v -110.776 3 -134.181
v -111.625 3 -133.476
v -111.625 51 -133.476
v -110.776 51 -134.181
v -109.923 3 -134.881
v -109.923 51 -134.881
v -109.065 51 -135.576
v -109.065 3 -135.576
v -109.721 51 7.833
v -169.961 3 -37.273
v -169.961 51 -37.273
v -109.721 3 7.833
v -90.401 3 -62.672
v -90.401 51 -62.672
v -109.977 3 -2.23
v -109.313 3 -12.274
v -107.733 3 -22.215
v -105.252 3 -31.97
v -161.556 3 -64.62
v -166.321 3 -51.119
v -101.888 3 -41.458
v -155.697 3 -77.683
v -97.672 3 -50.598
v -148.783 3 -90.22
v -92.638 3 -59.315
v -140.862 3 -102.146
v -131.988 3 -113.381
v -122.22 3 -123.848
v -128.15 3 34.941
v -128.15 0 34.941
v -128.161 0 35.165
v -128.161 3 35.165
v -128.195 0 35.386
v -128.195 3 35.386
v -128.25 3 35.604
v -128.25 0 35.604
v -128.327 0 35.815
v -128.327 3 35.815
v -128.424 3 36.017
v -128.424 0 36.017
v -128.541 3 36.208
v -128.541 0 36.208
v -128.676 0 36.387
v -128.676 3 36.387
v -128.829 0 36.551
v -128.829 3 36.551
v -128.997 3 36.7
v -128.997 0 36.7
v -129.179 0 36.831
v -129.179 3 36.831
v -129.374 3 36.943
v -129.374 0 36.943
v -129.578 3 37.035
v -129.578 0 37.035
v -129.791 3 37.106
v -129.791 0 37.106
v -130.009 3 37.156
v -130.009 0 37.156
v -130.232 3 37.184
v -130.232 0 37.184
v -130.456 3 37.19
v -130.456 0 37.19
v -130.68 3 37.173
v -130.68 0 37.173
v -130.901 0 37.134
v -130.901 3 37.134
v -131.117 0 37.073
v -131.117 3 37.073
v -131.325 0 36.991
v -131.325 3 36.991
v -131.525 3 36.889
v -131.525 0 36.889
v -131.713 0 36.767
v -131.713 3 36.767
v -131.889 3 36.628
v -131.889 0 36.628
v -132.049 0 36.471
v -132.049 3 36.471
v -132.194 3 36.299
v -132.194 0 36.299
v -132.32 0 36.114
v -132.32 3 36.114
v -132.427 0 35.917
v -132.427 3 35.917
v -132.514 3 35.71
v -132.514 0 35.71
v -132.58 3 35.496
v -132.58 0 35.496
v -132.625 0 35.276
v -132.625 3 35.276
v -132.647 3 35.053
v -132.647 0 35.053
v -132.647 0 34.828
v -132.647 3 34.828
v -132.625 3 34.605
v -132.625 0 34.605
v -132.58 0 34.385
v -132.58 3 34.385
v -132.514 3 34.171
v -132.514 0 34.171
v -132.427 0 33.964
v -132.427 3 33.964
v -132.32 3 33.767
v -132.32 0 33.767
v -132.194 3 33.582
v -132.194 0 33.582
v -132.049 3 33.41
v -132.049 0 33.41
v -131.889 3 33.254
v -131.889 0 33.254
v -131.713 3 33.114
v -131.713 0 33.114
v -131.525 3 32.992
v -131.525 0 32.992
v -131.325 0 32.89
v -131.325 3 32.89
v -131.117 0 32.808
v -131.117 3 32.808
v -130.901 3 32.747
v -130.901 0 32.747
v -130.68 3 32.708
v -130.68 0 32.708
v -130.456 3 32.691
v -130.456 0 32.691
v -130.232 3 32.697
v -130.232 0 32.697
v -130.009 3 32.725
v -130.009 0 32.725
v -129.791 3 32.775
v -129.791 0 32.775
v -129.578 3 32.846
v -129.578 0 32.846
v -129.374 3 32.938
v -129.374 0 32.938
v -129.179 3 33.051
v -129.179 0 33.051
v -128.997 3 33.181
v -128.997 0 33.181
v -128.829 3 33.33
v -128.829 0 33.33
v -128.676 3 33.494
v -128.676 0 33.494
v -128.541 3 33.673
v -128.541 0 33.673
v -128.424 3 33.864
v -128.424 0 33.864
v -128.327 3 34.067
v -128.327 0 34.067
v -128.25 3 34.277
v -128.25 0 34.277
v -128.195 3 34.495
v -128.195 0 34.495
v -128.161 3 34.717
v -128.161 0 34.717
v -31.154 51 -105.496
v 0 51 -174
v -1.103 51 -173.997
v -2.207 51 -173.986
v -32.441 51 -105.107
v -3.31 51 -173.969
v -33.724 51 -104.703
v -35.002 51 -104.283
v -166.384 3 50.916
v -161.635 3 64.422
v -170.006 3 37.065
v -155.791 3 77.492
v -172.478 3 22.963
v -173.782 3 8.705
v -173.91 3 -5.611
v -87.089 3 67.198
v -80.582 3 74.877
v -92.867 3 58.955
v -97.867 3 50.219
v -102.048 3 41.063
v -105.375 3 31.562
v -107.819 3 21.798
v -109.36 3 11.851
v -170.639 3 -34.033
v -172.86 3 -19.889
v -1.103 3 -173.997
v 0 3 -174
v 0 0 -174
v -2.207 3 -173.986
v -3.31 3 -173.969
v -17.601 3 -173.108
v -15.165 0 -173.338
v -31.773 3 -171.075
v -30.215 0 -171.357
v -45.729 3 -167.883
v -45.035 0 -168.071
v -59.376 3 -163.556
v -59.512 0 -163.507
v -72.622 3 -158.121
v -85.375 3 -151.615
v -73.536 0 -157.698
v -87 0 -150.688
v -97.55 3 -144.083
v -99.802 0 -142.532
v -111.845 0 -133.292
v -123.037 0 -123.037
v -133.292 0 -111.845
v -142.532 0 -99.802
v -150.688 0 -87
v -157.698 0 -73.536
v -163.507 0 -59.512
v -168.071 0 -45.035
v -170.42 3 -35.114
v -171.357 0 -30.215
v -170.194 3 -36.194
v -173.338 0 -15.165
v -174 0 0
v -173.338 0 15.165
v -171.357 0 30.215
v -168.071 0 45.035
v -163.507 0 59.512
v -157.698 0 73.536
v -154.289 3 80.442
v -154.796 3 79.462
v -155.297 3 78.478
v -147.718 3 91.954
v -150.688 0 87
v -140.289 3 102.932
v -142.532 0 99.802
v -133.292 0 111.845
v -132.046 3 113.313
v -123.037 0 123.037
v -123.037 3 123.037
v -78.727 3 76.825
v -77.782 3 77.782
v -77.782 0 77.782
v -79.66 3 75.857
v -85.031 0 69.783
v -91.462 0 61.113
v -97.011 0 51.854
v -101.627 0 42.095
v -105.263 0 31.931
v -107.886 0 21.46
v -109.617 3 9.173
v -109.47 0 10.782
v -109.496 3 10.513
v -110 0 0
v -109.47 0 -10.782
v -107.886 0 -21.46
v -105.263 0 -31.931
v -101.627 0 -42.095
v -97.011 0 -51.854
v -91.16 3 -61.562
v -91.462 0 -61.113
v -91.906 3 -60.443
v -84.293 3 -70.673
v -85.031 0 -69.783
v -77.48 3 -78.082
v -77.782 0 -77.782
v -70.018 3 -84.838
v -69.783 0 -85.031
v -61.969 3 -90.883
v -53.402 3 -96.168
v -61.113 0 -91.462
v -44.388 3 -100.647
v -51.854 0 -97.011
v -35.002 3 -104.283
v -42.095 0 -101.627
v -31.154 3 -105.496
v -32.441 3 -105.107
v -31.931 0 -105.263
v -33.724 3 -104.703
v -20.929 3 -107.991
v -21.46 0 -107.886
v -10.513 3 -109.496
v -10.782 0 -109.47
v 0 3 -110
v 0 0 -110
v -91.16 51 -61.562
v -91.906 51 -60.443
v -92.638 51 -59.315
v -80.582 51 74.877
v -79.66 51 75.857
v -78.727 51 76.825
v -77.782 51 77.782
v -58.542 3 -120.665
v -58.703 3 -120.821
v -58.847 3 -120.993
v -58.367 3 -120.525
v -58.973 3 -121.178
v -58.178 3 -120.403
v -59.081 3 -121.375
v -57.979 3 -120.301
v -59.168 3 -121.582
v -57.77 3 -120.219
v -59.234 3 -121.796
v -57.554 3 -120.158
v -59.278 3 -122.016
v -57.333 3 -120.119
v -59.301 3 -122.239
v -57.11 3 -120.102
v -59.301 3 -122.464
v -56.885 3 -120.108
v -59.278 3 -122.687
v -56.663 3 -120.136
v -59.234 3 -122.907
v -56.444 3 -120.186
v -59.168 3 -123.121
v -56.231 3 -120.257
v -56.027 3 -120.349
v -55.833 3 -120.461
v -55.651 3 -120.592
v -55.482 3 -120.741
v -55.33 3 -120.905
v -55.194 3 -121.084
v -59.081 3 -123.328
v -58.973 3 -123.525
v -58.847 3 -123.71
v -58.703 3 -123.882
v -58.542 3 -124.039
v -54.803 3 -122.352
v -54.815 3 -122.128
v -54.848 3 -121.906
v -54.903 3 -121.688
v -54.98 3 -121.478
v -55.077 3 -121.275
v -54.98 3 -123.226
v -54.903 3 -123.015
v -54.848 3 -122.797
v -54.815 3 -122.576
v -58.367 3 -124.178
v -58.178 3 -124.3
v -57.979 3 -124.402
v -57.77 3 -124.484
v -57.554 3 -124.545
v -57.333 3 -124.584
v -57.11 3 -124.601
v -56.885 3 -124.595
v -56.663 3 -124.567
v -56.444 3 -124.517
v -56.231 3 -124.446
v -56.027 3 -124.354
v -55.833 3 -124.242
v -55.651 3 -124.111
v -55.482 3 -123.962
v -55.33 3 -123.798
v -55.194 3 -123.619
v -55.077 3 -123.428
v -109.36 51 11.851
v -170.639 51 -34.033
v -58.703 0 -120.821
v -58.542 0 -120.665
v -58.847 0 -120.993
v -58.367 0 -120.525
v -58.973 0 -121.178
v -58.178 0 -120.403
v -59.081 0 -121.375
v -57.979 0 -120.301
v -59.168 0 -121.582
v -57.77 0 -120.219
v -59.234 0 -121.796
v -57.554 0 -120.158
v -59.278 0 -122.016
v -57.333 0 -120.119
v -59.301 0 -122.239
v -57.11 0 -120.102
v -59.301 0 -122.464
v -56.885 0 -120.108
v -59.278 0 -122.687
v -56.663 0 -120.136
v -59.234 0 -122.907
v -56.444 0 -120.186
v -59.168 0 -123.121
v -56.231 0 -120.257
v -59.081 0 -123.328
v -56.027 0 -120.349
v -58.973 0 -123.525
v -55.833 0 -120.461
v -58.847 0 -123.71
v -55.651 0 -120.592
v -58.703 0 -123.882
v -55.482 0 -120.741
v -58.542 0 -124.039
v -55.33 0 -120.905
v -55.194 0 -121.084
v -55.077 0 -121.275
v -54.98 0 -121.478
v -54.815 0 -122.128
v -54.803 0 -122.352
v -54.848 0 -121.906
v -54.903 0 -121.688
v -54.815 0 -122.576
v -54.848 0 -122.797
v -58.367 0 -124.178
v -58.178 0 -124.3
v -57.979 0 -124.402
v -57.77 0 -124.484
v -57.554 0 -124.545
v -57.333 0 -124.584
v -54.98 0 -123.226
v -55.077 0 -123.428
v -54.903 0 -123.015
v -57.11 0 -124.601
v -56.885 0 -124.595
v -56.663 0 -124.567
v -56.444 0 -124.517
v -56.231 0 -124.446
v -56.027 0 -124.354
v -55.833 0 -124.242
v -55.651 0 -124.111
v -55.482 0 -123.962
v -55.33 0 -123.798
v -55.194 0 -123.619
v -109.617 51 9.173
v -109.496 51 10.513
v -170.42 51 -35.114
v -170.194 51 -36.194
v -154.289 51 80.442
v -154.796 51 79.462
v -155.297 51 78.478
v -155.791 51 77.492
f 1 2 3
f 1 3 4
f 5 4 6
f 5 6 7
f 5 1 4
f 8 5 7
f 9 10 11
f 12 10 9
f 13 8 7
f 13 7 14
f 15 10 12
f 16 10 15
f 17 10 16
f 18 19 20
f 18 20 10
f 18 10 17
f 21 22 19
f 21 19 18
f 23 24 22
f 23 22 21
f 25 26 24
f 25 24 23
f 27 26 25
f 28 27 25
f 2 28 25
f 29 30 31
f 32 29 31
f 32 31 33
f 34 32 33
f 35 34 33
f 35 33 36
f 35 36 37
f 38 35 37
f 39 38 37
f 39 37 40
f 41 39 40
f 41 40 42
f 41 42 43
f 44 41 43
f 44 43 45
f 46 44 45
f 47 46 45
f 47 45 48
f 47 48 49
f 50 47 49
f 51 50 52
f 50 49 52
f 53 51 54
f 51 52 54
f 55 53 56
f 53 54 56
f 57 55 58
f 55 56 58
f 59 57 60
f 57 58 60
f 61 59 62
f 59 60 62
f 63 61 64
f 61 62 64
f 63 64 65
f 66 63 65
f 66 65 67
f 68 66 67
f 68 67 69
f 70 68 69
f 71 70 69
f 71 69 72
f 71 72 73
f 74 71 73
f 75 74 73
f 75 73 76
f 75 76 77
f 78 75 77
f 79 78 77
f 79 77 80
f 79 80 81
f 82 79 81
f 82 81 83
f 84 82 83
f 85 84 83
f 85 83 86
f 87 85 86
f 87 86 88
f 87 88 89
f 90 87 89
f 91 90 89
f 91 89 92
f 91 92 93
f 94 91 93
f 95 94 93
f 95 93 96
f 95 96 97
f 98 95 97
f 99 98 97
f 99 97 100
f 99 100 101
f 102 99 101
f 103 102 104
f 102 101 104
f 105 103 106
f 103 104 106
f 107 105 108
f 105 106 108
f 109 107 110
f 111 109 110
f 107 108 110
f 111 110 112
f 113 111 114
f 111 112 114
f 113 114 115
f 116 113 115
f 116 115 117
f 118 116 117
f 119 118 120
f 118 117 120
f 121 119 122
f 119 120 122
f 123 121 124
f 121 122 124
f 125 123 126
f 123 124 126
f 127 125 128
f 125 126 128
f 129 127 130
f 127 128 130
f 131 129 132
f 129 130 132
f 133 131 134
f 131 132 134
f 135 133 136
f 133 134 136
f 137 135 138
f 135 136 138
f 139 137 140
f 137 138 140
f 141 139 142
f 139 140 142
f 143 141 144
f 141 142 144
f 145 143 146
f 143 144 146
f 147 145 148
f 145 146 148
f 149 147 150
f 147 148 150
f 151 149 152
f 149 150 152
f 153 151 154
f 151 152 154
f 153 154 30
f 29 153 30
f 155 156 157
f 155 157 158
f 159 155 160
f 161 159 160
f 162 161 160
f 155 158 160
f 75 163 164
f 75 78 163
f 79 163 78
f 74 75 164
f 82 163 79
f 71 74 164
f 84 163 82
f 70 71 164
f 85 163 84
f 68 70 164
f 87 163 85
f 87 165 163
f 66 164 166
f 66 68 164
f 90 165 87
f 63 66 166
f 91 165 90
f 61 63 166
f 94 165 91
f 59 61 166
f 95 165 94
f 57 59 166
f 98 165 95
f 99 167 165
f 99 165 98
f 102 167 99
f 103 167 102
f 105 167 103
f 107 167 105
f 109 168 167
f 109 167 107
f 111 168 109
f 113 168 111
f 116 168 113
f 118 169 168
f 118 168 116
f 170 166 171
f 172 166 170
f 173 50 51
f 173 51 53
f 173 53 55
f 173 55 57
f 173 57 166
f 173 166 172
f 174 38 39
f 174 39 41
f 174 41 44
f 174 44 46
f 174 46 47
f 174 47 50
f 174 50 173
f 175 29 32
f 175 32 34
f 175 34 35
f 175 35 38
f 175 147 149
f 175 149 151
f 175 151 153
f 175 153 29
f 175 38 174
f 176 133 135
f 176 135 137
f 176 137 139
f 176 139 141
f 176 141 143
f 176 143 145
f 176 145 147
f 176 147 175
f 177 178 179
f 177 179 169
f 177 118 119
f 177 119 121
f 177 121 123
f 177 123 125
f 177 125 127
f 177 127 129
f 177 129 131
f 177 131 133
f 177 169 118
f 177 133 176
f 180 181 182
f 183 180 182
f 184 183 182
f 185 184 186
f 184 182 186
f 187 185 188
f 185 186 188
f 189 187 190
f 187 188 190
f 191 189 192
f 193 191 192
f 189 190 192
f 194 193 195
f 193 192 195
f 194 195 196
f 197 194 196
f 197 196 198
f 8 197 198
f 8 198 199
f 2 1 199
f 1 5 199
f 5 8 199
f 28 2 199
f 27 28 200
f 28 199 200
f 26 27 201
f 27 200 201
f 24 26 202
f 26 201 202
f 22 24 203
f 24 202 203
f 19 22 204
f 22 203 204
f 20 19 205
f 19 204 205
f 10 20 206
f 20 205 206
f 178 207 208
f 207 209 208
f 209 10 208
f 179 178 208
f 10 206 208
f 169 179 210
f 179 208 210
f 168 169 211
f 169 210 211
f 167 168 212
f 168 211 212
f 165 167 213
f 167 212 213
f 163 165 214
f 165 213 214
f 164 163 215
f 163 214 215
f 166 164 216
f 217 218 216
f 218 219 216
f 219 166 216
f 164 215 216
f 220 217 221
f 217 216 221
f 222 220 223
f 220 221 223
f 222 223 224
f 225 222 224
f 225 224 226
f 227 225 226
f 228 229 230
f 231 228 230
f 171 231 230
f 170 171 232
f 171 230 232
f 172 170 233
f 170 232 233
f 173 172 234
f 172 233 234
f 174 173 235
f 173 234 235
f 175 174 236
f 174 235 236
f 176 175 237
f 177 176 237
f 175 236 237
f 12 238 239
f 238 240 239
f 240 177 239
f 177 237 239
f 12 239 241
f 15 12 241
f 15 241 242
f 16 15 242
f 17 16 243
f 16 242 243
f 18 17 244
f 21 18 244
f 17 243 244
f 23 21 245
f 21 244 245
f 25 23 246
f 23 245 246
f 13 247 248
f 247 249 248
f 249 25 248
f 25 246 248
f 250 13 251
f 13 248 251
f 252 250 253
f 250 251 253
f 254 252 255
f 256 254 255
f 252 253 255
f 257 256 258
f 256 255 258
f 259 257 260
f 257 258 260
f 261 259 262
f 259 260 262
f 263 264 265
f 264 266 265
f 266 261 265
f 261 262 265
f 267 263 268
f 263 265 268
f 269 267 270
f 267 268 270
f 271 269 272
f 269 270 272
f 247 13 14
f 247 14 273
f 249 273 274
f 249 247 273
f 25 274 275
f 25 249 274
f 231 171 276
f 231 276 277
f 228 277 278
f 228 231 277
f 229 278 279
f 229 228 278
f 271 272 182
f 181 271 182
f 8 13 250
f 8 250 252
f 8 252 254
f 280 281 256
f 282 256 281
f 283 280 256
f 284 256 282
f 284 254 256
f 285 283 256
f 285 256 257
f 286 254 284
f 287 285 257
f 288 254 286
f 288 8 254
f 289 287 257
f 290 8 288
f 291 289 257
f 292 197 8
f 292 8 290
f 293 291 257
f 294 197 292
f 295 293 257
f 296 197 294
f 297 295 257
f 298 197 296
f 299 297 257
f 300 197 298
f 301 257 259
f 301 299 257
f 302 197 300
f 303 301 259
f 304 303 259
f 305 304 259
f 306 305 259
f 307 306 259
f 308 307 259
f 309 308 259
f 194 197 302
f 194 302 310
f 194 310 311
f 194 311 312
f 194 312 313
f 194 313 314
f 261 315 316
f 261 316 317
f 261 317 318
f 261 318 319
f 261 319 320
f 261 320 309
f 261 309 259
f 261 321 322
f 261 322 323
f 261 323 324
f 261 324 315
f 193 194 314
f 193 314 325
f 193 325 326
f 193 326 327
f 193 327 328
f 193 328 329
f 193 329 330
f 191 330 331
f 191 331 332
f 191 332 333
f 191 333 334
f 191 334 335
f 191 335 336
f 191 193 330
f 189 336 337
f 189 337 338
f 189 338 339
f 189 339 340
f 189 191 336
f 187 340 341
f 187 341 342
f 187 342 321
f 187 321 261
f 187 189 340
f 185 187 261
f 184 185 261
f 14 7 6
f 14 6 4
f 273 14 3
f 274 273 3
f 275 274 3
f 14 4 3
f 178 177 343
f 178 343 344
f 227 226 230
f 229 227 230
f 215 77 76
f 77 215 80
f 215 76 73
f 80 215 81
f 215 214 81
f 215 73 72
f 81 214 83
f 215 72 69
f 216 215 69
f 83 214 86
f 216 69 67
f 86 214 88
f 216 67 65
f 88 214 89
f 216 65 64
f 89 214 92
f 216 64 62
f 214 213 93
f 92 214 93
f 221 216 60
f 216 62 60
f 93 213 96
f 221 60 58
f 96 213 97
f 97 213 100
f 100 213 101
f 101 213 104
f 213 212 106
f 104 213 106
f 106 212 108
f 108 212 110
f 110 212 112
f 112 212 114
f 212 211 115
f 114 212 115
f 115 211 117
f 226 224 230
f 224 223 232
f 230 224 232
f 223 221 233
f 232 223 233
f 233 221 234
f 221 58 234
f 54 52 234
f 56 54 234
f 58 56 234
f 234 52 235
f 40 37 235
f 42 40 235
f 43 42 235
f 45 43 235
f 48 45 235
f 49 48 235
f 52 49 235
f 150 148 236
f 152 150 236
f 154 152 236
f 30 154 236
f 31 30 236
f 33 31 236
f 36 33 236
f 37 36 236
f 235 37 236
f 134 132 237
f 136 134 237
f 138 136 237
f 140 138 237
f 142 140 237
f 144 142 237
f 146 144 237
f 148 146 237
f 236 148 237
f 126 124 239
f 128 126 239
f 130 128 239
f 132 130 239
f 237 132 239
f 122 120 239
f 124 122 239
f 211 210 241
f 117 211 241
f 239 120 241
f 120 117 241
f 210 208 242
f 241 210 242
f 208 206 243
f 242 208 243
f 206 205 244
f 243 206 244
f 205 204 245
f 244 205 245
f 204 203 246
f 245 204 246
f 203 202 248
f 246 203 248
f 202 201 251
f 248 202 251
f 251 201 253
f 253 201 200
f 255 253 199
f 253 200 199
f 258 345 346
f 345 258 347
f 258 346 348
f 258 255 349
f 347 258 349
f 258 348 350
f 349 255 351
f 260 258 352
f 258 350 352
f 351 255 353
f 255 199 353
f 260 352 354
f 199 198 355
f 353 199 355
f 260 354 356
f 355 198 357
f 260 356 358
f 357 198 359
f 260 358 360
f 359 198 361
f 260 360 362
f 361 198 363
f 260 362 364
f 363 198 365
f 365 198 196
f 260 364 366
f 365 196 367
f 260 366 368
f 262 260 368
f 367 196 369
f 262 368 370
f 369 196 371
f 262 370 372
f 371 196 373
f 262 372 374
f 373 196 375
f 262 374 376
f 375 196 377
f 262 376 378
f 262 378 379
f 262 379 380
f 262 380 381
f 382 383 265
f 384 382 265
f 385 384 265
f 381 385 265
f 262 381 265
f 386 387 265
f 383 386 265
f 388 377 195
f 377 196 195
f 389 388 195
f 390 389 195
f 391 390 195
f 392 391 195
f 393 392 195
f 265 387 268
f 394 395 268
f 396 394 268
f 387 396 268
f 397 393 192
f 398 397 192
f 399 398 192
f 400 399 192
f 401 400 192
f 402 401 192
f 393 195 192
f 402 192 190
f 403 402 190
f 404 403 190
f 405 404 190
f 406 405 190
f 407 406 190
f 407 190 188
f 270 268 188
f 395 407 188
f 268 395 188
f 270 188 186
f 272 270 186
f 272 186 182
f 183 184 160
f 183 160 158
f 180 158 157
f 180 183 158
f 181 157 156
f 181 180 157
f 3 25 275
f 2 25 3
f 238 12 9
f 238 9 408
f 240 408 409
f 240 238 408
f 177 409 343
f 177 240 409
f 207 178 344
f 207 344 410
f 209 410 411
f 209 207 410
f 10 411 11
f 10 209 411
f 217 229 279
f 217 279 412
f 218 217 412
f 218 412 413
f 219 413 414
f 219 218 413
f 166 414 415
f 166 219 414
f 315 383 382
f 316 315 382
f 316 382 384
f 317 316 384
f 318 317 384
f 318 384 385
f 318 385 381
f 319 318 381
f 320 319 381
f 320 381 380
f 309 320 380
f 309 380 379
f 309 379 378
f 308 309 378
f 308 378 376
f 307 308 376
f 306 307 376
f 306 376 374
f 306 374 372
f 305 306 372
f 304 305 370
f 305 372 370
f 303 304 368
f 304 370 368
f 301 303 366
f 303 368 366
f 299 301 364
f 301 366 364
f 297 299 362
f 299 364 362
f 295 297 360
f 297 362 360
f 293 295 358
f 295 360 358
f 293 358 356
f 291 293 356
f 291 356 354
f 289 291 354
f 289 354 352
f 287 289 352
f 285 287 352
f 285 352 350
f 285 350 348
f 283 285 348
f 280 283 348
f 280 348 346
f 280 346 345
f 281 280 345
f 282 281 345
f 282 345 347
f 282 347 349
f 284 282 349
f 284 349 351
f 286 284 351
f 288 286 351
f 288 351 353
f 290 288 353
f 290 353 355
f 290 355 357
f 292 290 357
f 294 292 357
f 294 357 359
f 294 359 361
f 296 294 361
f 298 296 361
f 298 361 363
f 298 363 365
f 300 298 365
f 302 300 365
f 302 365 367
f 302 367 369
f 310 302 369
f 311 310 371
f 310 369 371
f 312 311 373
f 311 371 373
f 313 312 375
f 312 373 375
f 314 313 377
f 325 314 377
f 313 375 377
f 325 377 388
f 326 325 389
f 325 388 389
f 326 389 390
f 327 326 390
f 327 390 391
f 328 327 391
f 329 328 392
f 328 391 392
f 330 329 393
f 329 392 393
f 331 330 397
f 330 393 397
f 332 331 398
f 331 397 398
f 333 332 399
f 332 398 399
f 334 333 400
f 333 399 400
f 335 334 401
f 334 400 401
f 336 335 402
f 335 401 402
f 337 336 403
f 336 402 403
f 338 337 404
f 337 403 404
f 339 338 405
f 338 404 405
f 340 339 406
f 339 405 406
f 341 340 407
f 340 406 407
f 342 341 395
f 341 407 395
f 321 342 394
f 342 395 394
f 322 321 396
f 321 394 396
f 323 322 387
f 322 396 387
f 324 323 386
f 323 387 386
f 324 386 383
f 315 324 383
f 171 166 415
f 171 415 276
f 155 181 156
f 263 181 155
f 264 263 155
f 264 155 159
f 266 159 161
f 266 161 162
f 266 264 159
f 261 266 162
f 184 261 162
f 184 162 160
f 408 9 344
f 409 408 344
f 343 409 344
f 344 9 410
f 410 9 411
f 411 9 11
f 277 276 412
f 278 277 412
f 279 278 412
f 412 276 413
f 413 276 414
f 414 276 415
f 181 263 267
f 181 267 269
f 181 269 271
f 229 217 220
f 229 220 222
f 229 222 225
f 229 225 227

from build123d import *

# Parameters (mm, degrees)
BOSS_EXTRUDE3_DEPTH = 3
BOSS_EXTRUDE4_DEPTH = 48
CUT_EXTRUDE1_REACH  = 53
SKETCH3_R           = 2.25


with BuildPart() as part:
    # Sketch1 → Boss-Extrude3 (new body)
    with BuildSketch(Plane(origin=(0, 0, 0), x_dir=(1, 0, 0), z_dir=(0, 1, 0))):
        with BuildLine():
            Line((0, 110), (0, 174))
            ThreePointArc((0, 174), (-160.755038657, 66.586917232), (-123.036579926, -123.036579926))
            Line((-123.036579926, -123.036579926), (-77.781745931, -77.781745931))
            ThreePointArc((-77.781745931, -77.781745931), (-101.626748576, 42.09517756), (0, 110))
        make_face()
    extrude(amount=BOSS_EXTRUDE3_DEPTH)

    # Sketch2 → Boss-Extrude4 (add)
    with BuildSketch(Plane(origin=(0, 3, 0), x_dir=(1, 0, 0), z_dir=(0, 1, 0))):
        with BuildLine():
            Line((0, 174), (-31.15408253, 105.496081168))
            ThreePointArc((-31.15408253, 105.496081168), (-33.083376151, 104.907055161), (-35.001544118, 104.282749817))
            Line((-35.001544118, 104.282749817), (-3.30998401, 173.96851441))
            ThreePointArc((-3.30998401, 173.96851441), (-1.655066878, 173.992128424), (0, 174))
        make_face()
        with BuildLine():
            Line((-109.065465459, 135.575529666), (-90.400634695, 62.671566494))
            ThreePointArc((-90.400634695, 62.671566494), (-91.534672677, 61.00330891), (-92.637928339, 59.31453644))
            Line((-92.637928339, 59.31453644), (-111.624769164, 133.476255975))
            ThreePointArc((-111.624769164, 133.476255975), (-110.350109434, 134.531978904), (-109.065465459, 135.575529666))
        make_face()
        with BuildLine():
            Line((-169.961014343, 37.272692462), (-109.720790239, -7.832508497))
            ThreePointArc((-109.720790239, -7.832508497), (-109.558712711, -9.843194048), (-109.359791534, -11.850569418))
            Line((-109.359791534, -11.850569418), (-170.639294189, 34.032797103))
            ThreePointArc((-170.639294189, 34.032797103), (-170.307858813, 35.654357748), (-169.961014343, 37.272692462))
        make_face()
        with BuildLine():
            Line((-155.791483302, -77.492023659), (-80.581598087, -74.877273253))
            ThreePointArc((-80.581598087, -74.877273253), (-79.194988304, -76.342346228), (-77.781745931, -77.781745931))
            Line((-77.781745931, -77.781745931), (-154.289169819, -80.441606627))
            ThreePointArc((-154.289169819, -80.441606627), (-155.047340737, -78.970387679), (-155.791483302, -77.492023659))
        make_face()
    extrude(amount=BOSS_EXTRUDE4_DEPTH)

    # Sketch3 → Cut-Extrude1 (cut, up to next)
    with BuildSketch(Plane.XZ, mode=Mode.PRIVATE) as cut_extrude1_sk1:
        with Locations((-57.053465335, -122.35155125)):
            Circle(SKETCH3_R)
    cut_extrude1_tool1 = extrude(cut_extrude1_sk1.sketch, amount=-CUT_EXTRUDE1_REACH, mode=Mode.PRIVATE) & part.part
    add(cut_extrude1_tool1.solids().sort_by_distance((-57.053465, 0, -122.351551))[0], mode=Mode.SUBTRACT)
    # Sketch3 → Cut-Extrude1 (cut, up to next)
    with BuildSketch(Plane.XZ, mode=Mode.PRIVATE) as cut_extrude1_sk2:
        with Locations((-130.399986549, 34.940571089)):
            Circle(SKETCH3_R)
    cut_extrude1_tool2 = extrude(cut_extrude1_sk2.sketch, amount=-CUT_EXTRUDE1_REACH, mode=Mode.PRIVATE) & part.part
    add(cut_extrude1_tool2.solids().sort_by_distance((-130.399987, 0, 34.940571))[0], mode=Mode.SUBTRACT)


solid = part.part
